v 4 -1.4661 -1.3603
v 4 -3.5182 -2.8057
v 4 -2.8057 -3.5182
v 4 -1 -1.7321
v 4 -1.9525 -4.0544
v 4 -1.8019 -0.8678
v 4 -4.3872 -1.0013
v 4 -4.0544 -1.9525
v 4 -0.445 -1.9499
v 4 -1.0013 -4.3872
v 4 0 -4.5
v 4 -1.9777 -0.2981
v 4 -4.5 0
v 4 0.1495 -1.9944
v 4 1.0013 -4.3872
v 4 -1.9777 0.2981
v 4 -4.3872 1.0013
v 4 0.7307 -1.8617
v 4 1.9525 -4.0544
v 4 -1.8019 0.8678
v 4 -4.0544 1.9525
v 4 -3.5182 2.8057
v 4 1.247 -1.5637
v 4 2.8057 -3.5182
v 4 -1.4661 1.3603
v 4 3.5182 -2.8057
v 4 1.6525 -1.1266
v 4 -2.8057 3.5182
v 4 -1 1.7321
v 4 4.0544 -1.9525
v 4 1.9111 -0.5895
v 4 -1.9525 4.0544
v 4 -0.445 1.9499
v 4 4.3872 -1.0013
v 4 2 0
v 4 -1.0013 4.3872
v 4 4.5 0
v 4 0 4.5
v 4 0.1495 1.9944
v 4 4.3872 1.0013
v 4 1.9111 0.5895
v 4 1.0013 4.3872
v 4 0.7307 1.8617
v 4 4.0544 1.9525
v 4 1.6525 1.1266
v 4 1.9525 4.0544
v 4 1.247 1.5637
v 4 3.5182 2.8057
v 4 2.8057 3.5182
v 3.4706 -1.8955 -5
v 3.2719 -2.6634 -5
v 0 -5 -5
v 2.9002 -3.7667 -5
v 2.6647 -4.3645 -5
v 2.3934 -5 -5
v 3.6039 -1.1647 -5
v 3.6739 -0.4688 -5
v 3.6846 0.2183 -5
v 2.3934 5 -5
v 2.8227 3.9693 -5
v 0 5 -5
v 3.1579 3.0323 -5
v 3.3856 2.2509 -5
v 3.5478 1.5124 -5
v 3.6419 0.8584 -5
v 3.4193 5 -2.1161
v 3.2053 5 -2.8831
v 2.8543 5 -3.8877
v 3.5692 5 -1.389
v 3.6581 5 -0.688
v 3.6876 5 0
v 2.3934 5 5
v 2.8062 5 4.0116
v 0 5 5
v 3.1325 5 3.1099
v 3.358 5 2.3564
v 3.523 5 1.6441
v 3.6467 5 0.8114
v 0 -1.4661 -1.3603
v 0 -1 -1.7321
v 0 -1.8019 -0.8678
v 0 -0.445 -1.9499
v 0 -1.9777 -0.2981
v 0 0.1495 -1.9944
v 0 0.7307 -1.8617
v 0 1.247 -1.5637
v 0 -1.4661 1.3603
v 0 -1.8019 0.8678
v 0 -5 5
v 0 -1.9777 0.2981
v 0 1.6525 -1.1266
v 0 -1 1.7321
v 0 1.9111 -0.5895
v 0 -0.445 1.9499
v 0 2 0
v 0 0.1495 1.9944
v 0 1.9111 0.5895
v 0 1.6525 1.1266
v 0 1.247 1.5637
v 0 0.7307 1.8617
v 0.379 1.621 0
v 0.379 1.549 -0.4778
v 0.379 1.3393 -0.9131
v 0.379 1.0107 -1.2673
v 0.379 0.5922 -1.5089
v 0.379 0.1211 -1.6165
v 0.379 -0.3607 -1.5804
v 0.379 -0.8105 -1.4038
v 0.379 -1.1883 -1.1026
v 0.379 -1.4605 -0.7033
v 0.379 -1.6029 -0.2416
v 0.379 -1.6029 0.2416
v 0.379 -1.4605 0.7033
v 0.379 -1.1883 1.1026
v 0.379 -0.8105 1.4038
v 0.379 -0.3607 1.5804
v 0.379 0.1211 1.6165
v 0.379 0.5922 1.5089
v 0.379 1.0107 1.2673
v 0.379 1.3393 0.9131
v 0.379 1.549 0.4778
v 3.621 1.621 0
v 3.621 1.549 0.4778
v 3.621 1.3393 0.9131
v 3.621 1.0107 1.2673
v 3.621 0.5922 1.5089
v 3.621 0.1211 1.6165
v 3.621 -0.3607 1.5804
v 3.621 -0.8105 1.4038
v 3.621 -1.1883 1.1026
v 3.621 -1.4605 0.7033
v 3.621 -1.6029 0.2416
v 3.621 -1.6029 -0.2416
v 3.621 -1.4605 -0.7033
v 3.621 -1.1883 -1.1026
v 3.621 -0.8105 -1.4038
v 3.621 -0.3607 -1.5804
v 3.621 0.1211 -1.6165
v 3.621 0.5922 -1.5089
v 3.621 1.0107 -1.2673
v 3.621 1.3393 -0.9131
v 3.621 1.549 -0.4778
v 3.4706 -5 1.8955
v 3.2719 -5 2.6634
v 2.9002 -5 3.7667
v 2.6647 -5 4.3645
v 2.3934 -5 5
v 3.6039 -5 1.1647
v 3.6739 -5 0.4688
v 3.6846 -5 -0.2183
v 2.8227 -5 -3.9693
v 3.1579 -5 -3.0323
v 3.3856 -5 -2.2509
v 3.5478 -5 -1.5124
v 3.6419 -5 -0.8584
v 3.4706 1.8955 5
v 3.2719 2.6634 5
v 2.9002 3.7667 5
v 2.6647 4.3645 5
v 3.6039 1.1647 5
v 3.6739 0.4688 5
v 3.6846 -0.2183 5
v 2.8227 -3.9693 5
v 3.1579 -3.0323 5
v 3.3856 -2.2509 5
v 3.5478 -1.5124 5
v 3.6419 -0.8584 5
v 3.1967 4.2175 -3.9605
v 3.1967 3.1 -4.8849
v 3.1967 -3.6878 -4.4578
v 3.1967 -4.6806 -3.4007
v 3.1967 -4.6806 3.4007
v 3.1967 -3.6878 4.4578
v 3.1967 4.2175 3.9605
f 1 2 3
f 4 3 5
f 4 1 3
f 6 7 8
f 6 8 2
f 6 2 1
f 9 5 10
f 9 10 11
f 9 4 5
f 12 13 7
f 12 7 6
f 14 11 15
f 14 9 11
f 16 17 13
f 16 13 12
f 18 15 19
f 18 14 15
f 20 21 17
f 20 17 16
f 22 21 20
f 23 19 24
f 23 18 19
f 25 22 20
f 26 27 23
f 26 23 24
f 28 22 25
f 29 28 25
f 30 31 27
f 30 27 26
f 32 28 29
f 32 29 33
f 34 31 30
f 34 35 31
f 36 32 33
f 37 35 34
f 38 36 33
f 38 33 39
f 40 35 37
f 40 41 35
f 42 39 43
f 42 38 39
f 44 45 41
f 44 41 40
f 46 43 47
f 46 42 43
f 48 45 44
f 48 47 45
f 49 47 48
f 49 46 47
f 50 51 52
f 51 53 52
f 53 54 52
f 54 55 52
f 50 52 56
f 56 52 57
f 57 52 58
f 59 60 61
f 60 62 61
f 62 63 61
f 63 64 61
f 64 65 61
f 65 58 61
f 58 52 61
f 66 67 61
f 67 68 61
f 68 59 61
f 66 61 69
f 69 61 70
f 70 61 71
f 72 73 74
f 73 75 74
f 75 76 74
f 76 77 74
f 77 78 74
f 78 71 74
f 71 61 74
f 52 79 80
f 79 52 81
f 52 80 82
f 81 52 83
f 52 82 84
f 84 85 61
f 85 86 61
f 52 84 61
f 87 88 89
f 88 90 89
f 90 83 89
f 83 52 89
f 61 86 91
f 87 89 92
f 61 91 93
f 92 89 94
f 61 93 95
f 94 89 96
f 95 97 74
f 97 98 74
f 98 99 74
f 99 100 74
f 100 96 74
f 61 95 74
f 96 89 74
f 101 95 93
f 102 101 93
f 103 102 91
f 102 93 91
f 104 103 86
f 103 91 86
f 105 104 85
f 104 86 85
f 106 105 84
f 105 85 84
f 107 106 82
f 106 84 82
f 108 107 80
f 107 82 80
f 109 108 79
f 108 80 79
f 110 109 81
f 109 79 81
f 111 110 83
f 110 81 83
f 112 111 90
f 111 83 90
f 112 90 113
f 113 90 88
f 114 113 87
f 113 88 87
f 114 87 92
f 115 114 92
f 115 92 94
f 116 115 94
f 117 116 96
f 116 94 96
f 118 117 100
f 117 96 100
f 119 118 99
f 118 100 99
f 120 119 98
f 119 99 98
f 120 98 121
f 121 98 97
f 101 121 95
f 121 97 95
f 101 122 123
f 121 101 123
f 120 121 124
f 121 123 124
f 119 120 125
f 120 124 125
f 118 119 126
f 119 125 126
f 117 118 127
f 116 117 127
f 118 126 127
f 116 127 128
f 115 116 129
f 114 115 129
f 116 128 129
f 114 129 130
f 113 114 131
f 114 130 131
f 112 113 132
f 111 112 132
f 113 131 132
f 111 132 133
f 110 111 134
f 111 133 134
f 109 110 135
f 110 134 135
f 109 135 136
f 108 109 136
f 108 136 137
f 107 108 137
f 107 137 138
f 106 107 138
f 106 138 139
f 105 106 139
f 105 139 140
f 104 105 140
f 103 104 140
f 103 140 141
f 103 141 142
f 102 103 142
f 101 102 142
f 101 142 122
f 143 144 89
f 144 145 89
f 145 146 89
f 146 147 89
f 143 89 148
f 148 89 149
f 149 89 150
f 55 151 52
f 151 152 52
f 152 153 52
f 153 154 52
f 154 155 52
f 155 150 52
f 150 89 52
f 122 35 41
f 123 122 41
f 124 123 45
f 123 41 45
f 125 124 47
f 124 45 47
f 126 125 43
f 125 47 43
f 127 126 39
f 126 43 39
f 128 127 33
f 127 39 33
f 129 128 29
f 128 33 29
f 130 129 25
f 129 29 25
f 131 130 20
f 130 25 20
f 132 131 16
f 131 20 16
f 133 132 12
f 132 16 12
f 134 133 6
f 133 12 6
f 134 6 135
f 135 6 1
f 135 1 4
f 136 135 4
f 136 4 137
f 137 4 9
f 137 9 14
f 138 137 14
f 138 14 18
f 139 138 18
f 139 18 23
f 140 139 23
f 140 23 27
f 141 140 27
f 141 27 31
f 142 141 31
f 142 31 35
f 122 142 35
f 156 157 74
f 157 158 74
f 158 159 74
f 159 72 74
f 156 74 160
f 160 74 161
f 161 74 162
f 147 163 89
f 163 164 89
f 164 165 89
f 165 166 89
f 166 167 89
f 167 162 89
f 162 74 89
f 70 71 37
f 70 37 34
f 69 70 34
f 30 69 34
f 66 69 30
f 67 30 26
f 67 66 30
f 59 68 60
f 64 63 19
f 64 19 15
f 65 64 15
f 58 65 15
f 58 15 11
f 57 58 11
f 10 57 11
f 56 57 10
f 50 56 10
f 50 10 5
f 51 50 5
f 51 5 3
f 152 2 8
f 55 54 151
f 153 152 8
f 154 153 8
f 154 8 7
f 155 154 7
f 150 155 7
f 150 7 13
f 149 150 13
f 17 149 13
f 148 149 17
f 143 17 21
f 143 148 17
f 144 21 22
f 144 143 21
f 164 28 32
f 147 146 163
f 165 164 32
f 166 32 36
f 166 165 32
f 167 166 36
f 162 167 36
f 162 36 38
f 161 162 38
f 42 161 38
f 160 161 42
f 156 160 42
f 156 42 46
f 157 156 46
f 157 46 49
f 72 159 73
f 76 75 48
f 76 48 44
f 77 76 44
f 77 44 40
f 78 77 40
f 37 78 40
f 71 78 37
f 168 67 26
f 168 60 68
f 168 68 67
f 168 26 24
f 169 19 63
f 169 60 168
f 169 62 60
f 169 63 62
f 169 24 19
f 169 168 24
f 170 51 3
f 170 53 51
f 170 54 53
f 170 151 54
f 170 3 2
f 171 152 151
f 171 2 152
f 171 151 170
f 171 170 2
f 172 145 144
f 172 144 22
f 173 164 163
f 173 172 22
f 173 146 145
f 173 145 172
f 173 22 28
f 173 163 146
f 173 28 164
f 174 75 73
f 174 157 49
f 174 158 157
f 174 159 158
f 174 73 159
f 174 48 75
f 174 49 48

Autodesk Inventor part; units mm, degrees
ref_plane "YZ Plane" through (0, 0, 0) normal (1, 0, 0) x (0, 1, 0)
ref_plane "XZ Plane" through (0, 0, 0) normal (0, 1, 0) x (-1, 0, 0)
ref_plane "XY Plane" through (0, 0, 0) normal (0, 0, 1) x (1, 0, 0)
sketch "Skizze_1" plane through (0, 0, 0) normal (0, 0, 1) x (1, 0, 0)
  line L0 (4, 0) -> (0, 0)
  line L1 (0, 0) -> (0, 7.0725)
  line L2 (0, 7.0725) -> (2.3925, 7.0725)
  line L3 (2.3925, 7.0725) -> (4, 4.5)
  line L4 (4, 4.5) -> (4, 0)
  line L5 (4, 0) -> (0, 0)
revolve "Revolution1" add sketch "Skizze_1" angle 360 about axis through (4, 0, 0) along (1, 0, 0)
sketch "Skizze_2" plane through (0, 0, 0) normal (0, 0, 1) x (1, 0, 0)
  line L0 (4, 0) -> (0, 0)
  line L1 (0, 0) -> (0, 2)
  line L2 (0, 2) -> (0.379, 1.621)
  line L3 (0.379, 1.621) -> (3.621, 1.621)
  line L4 (3.621, 1.621) -> (4, 2)
  line L5 (4, 2) -> (4, 0)
  line L6 (4, 0) -> (0, 0)
revolve "Revolution2" cut sketch "Skizze_2" angle 360 about axis through (4, 0, 0) along (1, 0, 0)
thread "Thread1" size "M4x0.7" class "6H" standard "ISO Metric profile" full length
sketch "Skizze_3" plane through (0, 0, 0) normal (1, 0, 0) x (0, 1, 0)
  line L0 (10, 10) -> (-10, 10)
  line L1 (-10, 10) -> (-10, -10)
  line L2 (-10, -10) -> (10, -10)
  line L3 (10, -10) -> (10, 10)
  line L4 (5, 5) -> (-5, 5)
  line L5 (-5, 5) -> (-5, -5)
  line L6 (-5, -5) -> (5, -5)
  line L7 (5, -5) -> (5, 5)
extrude "Extrusion1" cut sketch "Skizze_3" along normal blind 4
properties part number "25.50.0540"
